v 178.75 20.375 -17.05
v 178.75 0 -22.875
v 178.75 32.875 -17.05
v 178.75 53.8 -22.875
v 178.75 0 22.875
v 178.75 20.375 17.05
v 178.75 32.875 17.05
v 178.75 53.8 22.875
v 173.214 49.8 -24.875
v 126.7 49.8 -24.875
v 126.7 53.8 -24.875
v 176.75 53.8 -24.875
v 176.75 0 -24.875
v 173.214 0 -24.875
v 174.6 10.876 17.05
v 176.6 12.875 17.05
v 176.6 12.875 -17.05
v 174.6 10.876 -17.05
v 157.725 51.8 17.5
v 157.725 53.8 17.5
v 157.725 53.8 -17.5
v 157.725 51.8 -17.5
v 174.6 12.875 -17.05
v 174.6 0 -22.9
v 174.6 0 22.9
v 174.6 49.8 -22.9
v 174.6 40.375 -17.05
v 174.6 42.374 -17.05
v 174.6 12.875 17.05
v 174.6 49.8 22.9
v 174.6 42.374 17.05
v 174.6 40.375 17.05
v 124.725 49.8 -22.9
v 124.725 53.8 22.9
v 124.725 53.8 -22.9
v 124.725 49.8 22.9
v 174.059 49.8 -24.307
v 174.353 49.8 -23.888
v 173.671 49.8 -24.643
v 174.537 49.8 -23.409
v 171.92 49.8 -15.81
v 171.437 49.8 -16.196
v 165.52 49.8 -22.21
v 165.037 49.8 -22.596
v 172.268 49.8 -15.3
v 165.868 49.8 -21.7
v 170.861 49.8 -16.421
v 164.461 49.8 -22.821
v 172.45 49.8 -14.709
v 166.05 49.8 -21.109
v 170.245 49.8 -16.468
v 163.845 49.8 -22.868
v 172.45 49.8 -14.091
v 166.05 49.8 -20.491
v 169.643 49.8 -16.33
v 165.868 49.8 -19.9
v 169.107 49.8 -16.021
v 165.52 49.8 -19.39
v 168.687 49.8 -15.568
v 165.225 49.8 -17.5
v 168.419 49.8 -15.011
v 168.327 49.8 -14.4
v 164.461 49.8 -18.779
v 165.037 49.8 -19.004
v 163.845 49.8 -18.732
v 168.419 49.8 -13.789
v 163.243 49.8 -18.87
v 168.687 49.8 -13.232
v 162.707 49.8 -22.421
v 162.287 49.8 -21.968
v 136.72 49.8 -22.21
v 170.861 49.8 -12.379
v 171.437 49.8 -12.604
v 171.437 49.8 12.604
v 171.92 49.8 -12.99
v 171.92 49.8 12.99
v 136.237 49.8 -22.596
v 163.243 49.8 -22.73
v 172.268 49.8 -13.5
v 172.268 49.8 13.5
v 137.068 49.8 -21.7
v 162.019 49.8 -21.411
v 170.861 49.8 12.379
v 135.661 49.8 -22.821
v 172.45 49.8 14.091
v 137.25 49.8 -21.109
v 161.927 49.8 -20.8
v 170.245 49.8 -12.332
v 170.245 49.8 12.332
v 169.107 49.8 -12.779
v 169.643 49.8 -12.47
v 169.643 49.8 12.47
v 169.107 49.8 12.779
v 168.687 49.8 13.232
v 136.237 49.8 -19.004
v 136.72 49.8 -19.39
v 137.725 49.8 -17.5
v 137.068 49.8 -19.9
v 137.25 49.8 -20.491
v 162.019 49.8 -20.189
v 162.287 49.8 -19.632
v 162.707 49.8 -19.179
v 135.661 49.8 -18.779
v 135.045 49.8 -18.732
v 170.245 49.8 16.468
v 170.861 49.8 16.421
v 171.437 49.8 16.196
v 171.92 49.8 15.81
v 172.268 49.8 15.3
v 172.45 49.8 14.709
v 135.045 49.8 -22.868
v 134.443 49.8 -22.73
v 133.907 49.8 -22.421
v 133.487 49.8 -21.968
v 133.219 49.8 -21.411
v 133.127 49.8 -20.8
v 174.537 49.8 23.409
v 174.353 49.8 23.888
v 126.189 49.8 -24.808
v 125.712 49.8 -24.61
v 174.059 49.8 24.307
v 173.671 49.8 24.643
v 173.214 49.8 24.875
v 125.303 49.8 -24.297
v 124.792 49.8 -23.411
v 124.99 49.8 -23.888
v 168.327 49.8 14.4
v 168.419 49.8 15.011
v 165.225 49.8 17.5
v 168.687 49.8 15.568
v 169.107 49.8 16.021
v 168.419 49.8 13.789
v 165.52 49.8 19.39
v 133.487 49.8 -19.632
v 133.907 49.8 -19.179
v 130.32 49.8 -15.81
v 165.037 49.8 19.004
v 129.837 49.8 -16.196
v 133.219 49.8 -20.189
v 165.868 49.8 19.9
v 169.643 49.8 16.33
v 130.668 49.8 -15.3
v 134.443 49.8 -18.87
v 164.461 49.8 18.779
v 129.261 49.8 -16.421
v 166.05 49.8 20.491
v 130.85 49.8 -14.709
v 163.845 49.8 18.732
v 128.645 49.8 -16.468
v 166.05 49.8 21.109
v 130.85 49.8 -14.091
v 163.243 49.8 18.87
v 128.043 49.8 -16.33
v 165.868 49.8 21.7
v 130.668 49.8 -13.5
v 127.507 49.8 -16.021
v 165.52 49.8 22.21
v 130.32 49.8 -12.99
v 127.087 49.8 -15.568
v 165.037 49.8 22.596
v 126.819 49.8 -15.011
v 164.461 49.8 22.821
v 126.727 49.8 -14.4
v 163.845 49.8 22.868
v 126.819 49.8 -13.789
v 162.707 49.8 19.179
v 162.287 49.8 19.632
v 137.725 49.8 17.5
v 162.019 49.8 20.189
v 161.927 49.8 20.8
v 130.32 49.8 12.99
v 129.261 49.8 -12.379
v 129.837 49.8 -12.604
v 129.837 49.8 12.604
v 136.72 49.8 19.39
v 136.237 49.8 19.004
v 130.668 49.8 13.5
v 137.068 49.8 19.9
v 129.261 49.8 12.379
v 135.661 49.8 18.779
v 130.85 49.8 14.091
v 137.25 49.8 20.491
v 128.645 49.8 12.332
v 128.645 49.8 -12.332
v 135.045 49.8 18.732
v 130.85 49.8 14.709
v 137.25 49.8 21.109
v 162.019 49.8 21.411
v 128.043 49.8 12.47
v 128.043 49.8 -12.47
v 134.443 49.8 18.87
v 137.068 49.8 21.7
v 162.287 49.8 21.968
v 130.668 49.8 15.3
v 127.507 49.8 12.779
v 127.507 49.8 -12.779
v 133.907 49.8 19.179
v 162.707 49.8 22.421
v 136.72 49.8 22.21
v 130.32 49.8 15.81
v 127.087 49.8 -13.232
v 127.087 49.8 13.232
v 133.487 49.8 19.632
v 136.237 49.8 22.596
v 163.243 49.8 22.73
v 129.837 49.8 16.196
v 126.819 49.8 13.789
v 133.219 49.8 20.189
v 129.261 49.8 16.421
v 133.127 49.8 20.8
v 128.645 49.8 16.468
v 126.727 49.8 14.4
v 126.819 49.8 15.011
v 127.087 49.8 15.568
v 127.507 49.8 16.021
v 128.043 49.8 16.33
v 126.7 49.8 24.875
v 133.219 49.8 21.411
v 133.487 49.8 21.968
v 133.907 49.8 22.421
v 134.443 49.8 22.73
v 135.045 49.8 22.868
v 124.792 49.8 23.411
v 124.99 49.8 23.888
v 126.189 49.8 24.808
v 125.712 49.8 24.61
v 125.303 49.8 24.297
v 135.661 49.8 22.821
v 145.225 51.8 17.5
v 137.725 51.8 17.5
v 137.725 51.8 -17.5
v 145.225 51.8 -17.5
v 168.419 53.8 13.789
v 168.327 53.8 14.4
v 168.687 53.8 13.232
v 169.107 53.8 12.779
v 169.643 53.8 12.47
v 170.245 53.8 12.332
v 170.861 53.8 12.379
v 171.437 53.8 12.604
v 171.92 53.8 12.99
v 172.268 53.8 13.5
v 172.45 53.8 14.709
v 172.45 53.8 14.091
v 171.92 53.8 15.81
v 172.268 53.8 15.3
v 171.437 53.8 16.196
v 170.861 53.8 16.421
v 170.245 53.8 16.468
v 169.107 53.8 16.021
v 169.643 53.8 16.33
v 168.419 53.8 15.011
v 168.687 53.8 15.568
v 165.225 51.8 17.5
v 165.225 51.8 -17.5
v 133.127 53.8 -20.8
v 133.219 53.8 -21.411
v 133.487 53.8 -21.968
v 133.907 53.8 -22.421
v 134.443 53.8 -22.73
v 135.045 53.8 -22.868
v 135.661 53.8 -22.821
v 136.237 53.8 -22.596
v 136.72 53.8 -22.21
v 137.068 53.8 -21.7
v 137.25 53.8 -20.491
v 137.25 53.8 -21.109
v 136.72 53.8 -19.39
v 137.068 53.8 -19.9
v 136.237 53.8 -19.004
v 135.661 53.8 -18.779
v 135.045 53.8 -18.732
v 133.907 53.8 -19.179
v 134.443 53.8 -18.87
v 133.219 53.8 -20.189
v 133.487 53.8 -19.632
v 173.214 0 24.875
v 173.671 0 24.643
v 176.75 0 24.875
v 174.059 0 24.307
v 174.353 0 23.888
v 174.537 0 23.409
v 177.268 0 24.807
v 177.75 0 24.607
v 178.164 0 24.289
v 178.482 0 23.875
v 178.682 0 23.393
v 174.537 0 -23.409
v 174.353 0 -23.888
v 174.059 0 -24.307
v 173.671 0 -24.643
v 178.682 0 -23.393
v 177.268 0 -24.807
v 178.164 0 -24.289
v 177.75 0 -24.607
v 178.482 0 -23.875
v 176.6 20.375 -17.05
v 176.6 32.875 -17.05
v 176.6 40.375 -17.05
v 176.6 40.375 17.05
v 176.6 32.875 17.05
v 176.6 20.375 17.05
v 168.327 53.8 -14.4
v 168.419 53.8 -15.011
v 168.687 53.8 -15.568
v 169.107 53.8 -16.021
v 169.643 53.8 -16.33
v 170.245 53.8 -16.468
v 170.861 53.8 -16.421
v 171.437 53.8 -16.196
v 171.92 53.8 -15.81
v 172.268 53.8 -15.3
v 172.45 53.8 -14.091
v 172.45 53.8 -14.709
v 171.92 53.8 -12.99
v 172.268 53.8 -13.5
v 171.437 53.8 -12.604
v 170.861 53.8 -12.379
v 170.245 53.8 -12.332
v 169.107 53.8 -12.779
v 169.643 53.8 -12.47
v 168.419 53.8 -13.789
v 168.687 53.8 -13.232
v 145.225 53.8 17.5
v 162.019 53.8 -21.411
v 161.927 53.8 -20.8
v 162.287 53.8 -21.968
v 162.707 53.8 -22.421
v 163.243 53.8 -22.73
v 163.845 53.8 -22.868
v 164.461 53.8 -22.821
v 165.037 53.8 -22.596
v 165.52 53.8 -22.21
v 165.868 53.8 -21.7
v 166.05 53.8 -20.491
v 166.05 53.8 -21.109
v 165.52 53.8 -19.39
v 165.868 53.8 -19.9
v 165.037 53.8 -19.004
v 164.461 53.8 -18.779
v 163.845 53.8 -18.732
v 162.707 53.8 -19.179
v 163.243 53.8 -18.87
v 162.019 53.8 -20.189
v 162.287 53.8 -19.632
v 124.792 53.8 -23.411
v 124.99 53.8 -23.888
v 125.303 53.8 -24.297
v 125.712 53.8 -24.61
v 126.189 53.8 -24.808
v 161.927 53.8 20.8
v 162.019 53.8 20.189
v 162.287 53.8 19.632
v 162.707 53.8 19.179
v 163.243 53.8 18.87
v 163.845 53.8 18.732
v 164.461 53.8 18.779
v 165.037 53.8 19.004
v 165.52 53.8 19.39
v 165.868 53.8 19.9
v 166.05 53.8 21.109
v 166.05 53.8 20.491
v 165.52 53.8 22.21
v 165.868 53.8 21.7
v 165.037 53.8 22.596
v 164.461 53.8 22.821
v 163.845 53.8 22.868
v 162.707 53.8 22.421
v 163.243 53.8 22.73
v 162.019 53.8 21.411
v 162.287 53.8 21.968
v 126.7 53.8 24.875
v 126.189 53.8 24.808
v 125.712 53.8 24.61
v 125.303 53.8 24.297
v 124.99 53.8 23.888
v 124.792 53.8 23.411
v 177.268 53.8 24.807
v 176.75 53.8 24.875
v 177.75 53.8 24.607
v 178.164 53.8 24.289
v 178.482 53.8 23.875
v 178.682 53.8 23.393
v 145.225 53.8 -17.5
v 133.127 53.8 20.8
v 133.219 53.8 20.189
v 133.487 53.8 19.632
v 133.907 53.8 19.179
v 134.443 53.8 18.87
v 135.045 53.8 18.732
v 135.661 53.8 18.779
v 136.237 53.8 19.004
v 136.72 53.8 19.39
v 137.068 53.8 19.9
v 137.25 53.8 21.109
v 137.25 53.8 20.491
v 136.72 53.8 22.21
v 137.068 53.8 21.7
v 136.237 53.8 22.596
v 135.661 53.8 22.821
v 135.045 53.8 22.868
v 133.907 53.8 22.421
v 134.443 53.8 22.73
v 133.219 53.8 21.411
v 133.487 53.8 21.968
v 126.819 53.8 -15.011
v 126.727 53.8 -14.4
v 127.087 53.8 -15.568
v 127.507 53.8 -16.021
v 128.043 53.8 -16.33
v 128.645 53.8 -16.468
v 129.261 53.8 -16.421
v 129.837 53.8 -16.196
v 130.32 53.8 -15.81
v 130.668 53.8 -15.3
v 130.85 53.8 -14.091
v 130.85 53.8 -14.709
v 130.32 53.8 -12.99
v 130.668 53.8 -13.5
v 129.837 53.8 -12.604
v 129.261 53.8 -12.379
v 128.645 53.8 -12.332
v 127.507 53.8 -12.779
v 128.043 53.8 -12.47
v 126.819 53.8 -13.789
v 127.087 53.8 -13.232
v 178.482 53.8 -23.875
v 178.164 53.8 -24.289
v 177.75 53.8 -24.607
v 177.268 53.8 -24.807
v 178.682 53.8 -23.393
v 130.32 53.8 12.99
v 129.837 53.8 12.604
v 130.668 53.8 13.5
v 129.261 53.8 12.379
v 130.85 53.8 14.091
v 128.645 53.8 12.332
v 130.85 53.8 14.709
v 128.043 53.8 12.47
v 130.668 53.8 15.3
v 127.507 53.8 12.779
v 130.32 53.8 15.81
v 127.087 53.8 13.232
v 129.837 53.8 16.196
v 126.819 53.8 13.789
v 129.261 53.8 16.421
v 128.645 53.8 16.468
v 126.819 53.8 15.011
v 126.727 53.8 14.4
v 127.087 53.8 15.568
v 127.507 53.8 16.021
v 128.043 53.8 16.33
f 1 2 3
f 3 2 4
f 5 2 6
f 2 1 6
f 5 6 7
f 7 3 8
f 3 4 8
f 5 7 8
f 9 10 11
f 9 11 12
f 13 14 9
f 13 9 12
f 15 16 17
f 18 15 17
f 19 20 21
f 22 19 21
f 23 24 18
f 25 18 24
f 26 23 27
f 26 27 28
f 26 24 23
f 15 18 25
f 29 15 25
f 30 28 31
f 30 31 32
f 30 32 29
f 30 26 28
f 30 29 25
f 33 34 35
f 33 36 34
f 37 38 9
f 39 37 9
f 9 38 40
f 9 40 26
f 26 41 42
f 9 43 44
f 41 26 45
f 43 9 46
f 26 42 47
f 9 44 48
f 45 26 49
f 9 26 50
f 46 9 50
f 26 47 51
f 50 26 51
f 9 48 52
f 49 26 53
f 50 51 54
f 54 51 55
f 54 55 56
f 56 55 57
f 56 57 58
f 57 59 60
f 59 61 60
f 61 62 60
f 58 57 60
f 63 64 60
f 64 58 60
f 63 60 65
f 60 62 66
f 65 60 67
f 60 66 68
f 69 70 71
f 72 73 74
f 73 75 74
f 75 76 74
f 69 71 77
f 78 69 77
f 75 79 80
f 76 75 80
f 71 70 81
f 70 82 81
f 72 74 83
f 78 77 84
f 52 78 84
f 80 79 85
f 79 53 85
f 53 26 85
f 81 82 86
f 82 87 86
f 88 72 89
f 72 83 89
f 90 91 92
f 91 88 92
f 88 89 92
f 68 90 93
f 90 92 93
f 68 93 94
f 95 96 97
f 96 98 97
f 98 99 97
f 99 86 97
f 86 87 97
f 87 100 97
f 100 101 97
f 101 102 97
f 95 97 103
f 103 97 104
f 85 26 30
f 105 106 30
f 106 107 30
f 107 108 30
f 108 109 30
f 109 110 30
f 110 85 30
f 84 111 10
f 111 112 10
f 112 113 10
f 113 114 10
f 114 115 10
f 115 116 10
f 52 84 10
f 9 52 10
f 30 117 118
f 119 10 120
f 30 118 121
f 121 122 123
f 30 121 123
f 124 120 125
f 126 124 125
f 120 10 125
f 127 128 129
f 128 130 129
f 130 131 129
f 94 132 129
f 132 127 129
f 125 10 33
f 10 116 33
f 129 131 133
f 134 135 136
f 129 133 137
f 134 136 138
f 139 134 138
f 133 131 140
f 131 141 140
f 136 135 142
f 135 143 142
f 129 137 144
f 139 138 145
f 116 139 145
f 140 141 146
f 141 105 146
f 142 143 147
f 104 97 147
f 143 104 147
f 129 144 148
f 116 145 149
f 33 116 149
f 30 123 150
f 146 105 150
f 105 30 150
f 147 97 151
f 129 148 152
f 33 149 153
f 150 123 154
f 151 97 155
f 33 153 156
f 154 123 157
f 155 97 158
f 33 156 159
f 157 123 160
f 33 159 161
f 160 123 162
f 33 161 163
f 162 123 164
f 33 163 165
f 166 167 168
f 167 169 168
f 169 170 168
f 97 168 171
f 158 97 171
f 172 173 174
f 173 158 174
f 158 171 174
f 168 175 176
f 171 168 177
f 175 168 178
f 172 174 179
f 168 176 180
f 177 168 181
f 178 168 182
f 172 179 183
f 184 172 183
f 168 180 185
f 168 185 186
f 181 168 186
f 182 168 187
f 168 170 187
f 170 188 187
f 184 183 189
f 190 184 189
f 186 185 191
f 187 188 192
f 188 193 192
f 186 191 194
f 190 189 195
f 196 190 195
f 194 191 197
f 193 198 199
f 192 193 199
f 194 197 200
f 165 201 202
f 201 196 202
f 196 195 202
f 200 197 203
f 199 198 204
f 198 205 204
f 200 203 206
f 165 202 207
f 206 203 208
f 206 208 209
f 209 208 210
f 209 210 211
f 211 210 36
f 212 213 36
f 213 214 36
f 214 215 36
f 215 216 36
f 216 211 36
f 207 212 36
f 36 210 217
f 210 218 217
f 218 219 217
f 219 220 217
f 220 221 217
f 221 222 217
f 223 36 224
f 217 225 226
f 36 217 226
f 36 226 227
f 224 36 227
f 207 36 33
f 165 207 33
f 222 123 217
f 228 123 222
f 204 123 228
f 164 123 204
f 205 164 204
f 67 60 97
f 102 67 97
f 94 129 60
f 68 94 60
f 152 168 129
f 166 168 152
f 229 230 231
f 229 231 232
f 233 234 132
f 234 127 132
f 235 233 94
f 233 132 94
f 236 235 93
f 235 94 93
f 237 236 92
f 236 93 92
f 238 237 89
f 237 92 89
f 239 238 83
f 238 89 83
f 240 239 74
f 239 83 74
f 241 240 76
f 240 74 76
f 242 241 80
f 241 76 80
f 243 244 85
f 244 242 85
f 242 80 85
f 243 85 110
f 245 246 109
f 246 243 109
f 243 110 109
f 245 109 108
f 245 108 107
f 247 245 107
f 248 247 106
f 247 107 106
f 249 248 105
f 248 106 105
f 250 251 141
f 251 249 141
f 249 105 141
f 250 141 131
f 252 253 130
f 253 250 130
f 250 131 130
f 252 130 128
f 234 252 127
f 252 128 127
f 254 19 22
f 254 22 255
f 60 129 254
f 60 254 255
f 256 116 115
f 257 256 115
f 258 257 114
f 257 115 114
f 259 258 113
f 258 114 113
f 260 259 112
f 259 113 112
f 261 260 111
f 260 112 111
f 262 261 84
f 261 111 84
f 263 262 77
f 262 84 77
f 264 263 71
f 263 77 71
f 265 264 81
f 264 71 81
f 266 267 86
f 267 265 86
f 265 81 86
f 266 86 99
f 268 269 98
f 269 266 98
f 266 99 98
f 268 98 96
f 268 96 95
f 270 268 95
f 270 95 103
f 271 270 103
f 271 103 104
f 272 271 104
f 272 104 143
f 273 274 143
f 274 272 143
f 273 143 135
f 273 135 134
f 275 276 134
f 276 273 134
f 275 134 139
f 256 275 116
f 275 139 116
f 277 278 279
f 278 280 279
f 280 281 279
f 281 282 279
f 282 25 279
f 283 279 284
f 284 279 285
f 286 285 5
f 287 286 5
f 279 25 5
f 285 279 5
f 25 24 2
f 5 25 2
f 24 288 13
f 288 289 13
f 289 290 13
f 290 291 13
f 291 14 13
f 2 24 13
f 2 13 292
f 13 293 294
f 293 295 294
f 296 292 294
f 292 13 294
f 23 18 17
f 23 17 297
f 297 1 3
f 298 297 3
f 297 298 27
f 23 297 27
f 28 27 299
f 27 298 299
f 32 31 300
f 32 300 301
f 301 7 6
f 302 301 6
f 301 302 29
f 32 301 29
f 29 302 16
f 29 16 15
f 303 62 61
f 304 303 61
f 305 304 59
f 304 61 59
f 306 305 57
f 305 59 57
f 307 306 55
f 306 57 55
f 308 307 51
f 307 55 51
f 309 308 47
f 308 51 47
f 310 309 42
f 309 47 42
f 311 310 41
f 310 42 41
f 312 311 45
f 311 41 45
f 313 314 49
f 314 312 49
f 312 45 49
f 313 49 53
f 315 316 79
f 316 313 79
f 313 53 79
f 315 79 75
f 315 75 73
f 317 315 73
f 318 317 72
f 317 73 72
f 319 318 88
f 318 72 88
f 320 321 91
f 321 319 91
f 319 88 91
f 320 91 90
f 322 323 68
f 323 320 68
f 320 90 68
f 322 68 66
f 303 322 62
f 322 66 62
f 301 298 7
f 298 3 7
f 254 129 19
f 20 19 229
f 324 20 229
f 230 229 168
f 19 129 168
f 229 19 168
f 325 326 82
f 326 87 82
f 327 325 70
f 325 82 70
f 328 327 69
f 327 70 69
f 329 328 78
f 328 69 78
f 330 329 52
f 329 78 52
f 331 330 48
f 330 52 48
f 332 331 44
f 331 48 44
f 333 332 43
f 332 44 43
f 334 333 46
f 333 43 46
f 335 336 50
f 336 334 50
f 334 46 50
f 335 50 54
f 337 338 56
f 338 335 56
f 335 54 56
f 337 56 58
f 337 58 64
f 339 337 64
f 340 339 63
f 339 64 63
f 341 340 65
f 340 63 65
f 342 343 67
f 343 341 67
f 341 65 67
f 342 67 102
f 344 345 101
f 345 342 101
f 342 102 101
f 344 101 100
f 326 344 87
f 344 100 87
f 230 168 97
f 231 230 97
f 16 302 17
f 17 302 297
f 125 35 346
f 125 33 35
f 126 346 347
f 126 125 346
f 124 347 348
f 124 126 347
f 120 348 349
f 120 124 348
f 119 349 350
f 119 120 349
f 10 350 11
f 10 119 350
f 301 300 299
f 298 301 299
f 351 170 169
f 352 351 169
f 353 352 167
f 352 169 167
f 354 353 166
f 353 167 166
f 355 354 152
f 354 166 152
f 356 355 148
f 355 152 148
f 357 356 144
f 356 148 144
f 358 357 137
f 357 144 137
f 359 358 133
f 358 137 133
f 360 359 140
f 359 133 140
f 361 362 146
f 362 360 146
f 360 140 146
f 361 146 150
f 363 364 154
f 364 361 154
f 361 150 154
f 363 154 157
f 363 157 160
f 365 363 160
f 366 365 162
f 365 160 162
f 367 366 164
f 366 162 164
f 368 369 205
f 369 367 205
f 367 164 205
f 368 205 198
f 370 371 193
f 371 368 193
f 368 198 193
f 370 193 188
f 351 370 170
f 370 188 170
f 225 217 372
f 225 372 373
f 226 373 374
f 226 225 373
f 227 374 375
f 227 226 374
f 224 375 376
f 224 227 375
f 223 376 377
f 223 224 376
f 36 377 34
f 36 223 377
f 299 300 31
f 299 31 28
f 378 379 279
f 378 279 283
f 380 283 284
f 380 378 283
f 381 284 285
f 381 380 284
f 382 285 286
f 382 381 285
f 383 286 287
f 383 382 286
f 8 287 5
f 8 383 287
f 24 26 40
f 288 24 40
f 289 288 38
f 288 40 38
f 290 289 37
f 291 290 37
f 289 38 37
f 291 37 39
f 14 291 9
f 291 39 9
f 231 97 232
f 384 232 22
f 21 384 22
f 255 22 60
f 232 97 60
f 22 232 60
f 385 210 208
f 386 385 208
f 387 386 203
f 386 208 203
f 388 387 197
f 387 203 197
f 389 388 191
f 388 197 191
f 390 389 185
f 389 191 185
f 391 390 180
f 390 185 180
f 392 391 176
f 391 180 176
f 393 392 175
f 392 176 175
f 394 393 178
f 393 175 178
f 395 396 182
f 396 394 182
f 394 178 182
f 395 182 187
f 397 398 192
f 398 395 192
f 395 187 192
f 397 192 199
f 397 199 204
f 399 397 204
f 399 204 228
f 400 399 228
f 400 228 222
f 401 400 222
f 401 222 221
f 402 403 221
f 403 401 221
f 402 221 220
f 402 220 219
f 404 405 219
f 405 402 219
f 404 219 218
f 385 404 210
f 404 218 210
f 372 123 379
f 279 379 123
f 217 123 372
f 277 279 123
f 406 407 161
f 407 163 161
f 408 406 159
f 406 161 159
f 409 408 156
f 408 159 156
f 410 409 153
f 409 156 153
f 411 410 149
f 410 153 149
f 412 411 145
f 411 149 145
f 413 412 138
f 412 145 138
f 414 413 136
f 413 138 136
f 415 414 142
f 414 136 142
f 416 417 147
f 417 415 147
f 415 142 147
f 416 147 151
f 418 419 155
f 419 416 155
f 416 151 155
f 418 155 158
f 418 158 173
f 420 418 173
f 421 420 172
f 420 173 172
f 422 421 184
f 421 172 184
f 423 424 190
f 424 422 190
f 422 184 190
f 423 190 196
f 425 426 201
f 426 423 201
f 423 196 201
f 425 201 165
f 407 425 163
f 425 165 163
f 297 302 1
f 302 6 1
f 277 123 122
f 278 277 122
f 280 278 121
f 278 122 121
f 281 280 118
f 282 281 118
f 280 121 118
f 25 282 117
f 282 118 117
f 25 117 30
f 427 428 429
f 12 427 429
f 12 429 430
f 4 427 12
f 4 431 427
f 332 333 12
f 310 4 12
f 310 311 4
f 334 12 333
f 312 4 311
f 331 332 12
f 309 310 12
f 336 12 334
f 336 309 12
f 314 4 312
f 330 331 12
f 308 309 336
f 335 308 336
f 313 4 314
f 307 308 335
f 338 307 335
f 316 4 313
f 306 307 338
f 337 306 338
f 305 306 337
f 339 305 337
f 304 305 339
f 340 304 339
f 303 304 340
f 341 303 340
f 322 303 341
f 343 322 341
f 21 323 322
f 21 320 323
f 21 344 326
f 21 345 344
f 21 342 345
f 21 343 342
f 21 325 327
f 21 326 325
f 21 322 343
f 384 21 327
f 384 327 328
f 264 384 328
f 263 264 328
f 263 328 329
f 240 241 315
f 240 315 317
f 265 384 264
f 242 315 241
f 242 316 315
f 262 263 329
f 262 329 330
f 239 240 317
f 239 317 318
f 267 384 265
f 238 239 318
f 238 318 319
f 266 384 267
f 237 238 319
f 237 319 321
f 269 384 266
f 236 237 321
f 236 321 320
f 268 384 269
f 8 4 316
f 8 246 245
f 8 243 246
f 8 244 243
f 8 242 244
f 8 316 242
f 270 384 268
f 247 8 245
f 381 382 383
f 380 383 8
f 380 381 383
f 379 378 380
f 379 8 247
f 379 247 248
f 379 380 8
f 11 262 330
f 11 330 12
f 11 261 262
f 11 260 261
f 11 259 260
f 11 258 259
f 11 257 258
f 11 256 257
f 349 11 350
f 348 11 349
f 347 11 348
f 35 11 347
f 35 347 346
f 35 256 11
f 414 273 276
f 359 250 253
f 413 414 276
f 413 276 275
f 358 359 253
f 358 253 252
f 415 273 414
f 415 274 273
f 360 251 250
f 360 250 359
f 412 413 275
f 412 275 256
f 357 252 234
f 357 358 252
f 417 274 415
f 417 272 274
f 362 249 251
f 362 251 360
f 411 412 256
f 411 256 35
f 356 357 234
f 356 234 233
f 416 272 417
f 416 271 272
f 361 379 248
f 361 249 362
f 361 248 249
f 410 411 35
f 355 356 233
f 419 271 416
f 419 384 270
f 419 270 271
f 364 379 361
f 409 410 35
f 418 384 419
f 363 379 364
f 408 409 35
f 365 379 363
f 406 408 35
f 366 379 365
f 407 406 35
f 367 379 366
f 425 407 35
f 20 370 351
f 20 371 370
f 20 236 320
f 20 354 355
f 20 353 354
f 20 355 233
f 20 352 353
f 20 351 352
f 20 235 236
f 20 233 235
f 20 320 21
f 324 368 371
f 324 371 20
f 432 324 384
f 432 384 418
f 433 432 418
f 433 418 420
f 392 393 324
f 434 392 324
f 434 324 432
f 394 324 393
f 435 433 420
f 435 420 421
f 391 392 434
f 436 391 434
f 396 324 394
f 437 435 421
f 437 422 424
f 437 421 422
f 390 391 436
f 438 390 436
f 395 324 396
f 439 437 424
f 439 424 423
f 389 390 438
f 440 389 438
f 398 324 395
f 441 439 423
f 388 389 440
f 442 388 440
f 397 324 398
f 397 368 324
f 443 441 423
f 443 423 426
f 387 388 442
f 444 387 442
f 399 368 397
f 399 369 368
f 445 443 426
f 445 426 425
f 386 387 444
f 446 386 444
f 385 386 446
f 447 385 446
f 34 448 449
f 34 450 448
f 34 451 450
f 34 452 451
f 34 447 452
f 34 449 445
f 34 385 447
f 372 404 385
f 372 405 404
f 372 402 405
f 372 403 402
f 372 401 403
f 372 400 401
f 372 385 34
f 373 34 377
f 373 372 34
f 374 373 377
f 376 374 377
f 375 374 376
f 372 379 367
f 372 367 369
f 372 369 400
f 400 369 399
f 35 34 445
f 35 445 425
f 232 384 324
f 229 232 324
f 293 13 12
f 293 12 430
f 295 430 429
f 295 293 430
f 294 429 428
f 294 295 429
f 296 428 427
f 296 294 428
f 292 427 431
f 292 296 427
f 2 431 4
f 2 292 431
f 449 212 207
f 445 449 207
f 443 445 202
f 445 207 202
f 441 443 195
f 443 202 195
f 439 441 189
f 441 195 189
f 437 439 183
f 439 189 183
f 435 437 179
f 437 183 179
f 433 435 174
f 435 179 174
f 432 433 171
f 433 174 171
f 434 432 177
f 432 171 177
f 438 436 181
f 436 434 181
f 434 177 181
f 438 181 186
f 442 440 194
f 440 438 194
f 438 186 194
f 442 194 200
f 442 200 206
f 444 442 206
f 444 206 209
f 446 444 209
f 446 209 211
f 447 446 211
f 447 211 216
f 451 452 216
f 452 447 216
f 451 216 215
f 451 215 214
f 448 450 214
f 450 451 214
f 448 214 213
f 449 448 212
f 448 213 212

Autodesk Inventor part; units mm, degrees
ref_plane "YZ Plane" through (0, 0, 0) normal (1, 0, 0) x (0, 1, 0)
ref_plane "XZ Plane" through (0, 0, 0) normal (0, 1, 0) x (-1, 0, 0)
sketch "Sketch1" plane through (0, 0, 0) normal (0, 1, 0) x (-1, 0, 0)
  line L0 (-155.225, -15) -> (-155.225, 15) projected
  line L1 (-155.225, 15) -> (-147.725, 15) projected
  line L2 (-147.725, 15) -> (-147.725, -15) projected
  line L3 (-147.725, -15) -> (-155.225, -15) projected
  circle A0 centre (-171.5, -21.9) radius 1.875 projected
  circle A1 centre (-127.7, 21.9) radius 1.875 projected
  circle A2 centre (-127.7, -21.9) radius 1.875 projected
  circle A3 centre (-171.5, 21.9) radius 1.875 projected
  circle A4 centre (-135.2, 20.8) radius 2.0734 projected
  circle A5 centre (-164, -20.8) radius 2.0734 projected
  circle A6 centre (-135.2, -20.8) radius 2.0734 projected
  circle A7 centre (-128.8, -14.4) radius 2.0734 projected
  circle A8 centre (-128.8, 14.4) radius 2.0734 projected
  circle A9 centre (-164, 20.8) radius 2.0734 projected
  circle A10 centre (-170.4, -14.4) radius 2.0734 projected
  circle A11 centre (-170.4, 14.4) radius 2.0734 projected
  line L4 (-172.5, 24.875) -> (-126.7, 24.875) projected
  arc A12 (-172.5, 24.875) -> (-174.475, 22.9) centre (-172.5, 22.9) ccw projected
  line L5 (-174.475, -22.9) -> (-174.475, 22.9) projected
  arc A13 (-174.475, -22.9) -> (-172.5, -24.875) centre (-172.5, -22.9) ccw projected
  line L6 (-126.7, -24.875) -> (-172.5, -24.875) projected
  arc A14 (-126.7, -24.875) -> (-124.725, -22.9) centre (-126.7, -22.9) ccw projected
  line L7 (-124.725, 22.9) -> (-124.725, -22.9) projected
  arc A15 (-124.725, 22.9) -> (-126.7, 24.875) centre (-126.7, 22.9) ccw projected
  point P0 (0, 0)
ref_plane "Work Plane1" through (124.725, 49.8, -24.875) normal (0, 1, 0) x (0, 0, 1)
extrude "Extrusion1" add sketch "Sketch1" along normal blind 4 from surface at 49.8 contours A0 | A1 | A2 | A3 | L4 A15 L7 A14 L6 A13 L5 A12
sketch "Sketch2" plane through (126.7, 53.8, -24.875) normal (0, 1, 0) x (1, 0, 0)
  line L0 (28.525, -9.875) -> (21.025, -9.875) projected
  line L1 (28.525, -39.875) -> (28.525, -9.875) projected
  line L2 (21.025, -39.875) -> (28.525, -39.875) projected
  line L3 (21.025, -9.875) -> (21.025, -39.875) projected
  circle A0 centre (8.5, -45.675) radius 2.0734 projected
  circle A1 centre (37.3, -4.075) radius 2.0734 projected
  circle A2 centre (8.5, -4.075) radius 2.0734 projected
  circle A3 centre (2.1, -10.475) radius 2.0734 projected
  circle A4 centre (2.1, -39.275) radius 2.0734 projected
  circle A5 centre (37.3, -45.675) radius 2.0734 projected
  circle A6 centre (43.7, -10.475) radius 2.0734 projected
  circle A7 centre (43.7, -39.275) radius 2.0734 projected
  arc A8 (47.775, -1.975) -> (45.8, 0) centre (45.8, -1.975) ccw projected
  line L4 (0, 0) -> (45.8, 0) projected
  arc A9 (0, 0) -> (-1.975, -1.975) centre (0, -1.975) ccw projected
  line L5 (-1.975, -47.775) -> (-1.975, -1.975) projected
  arc A10 (-1.975, -47.775) -> (0, -49.75) centre (0, -47.775) ccw projected
  line L6 (45.8, -49.75) -> (0, -49.75) projected
  arc A11 (45.8, -49.75) -> (47.775, -47.775) centre (45.8, -47.775) ccw projected
  line L7 (47.775, -1.975) -> (47.775, -47.775) projected
  line L8 (18.525, -42.375) -> (31.025, -42.375)
  line L9 (31.025, -42.375) -> (31.025, -7.375)
  line L10 (31.025, -7.375) -> (18.525, -7.375)
  line L11 (18.525, -7.375) -> (18.525, -42.375)
  line L12 (45.8, 0) -> (52.05, 0)
  line L13 (52.05, 0) -> (52.05, -49.75)
  line L14 (52.05, -49.75) -> (45.8, -49.75)
  line L15 (45.8, -49.75) -> (45.8, 0)
  line L16 (52.05, -49.75) -> (47.925, -49.75)
  line L17 (47.925, -49.75) -> (47.925, 0)
  line L18 (47.925, 0) -> (52.05, 0)
  line L19 (52.05, 0) -> (52.05, -49.75)
  arc A12 (45.8, -49.875) -> (47.9, -47.775) centre (45.8, -47.775) ccw
  line L20 (45.8, -49.875) -> (0, -49.875)
  arc A13 (-2.1, -47.775) -> (0, -49.875) centre (0, -47.775) ccw
  line L21 (-2.1, -47.775) -> (-2.1, -1.975)
  arc A14 (0, 0.125) -> (-2.1, -1.975) centre (0, -1.975) ccw
  line L22 (0, 0.125) -> (45.8, 0.125)
  arc A15 (47.9, -1.975) -> (45.8, 0.125) centre (45.8, -1.975) ccw
  line L23 (47.9, -1.975) -> (47.9, -47.775)
  line L24 (18.525, -42.375) -> (11.025, -42.375)
  line L25 (11.025, -42.375) -> (11.025, -7.375)
  line L26 (11.025, -7.375) -> (18.525, -7.375)
  line L27 (18.525, -7.375) -> (18.525, -42.375)
  line L28 (31.025, -42.375) -> (38.525, -42.375)
  line L29 (38.525, -42.375) -> (38.525, -7.375)
  line L30 (38.525, -7.375) -> (31.025, -7.375)
  line L31 (31.025, -7.375) -> (31.025, -42.375)
  point P0 (-126.7, -24.875)
  point P1 (46.5137, -49.75)
  point P2 (46.5137, 0)
  point P3 (31.025, -7.375)
  point P4 (18.525, -7.375)
  dimension "d2" = 2.5
  dimension "d3" = 6.25
  dimension "d4" = 4.125
  dimension "d15" = 0.125
  dimension "d16" = 7.5
  dimension "d17" = 7.5
extrude "Extrusion2" cut sketch "Sketch2" against normal up to surface (4 mm away) contours L11 L10 L9 L8
extrude "Extrusion3" add sketch "Sketch2" against normal up to surface (4 mm away) contours A8 L12 A15 L23 A12 L14 A11 L7 | L12 L17 L14 A12 L23 A15 | L12 L13 L14 L17
extrude "Extrusion4" add sketch "Sketch2" against normal blind 49.8 from surface at -4 contours L12 L17 L14 A12 L23 A15 | L12 L13 L14 L17
extrude "Extrusion5" cut sketch "Sketch2" along normal blind 2 from surface at -4 contours L24 L25 L26 L11 | L9 L30 L29 L28
fillet "Fillet1" radius 2 2 edges at (178.75, 26.9, 24.875) (178.75, 26.9, -24.875)
sketch "Sketch3" plane through (178.75, 53.8, 22.875) normal (1, 0, 0) x (0, 0, -1)
  line L0 (7.875, -23.425) -> (7.875, -30.925) projected
  line L1 (7.875, -30.925) -> (37.875, -30.925) projected
  line L2 (37.875, -30.925) -> (37.875, -23.425) projected
  line L3 (37.875, -23.425) -> (7.875, -23.425) projected
  line L4 (5.825, -11.7) -> (39.925, -11.7) projected
  line L5 (39.925, -46.1) -> (39.925, -11.7) projected
  line L6 (5.825, -46.1) -> (39.925, -46.1) projected
  line L7 (5.825, -11.7) -> (5.825, -46.1) projected
  line L8 (5.375, -20.925) -> (5.375, -33.425)
  line L9 (5.375, -33.425) -> (40.375, -33.425)
  line L10 (40.375, -33.425) -> (40.375, -20.925)
  line L11 (40.375, -20.925) -> (5.375, -20.925)
  point P0 (22.875, -53.8)
  point P1 (39.925, -20.925)
  point P2 (5.825, -20.925)
  point P3 (5.825, -33.425)
  point P4 (39.925, -33.425)
  dimension "d12" = 2.5
extrude "Extrusion6" cut sketch "Sketch3" against normal up to surface (4.15 mm away) contours L3 L2 L1 L0 | L11 L5 L9 L7
sketch "Sketch4" plane through (178.75, 53.8, 22.875) normal (1, 0, 0) x (0, 0, -1)
  line L0 (5.825, -20.925) -> (39.925, -20.925) projected
  line L1 (39.925, -20.925) -> (39.925, -33.425) projected
  line L2 (39.925, -33.425) -> (5.825, -33.425) projected
  line L3 (5.825, -33.425) -> (5.825, -20.925) projected
  line L4 (45.75, 0) -> (45.75, -53.8) projected
  line L5 (0, 0) -> (45.75, 0) projected
  line L6 (0, -53.8) -> (0, 0) projected
  line L7 (45.75, -53.8) -> (0, -53.8) projected
  line L8 (5.825, -20.925) -> (39.925, -20.925)
  line L9 (39.925, -20.925) -> (39.925, -13.425)
  line L10 (39.925, -13.425) -> (5.825, -13.425)
  line L11 (5.825, -13.425) -> (5.825, -20.925)
  line L12 (5.825, -33.425) -> (39.925, -33.425)
  line L13 (39.925, -33.425) -> (39.925, -40.925)
  line L14 (39.925, -40.925) -> (5.825, -40.925)
  line L15 (5.825, -40.925) -> (5.825, -33.425)
  point P0 (22.875, -53.8)
  point P1 (39.925, -20.925)
  dimension "d20" = 7.5
  dimension "d21" = 7.5
extrude "Extrusion7" cut sketch "Sketch4" along normal blind 2 from surface at -4.15 contours L11 L10 L9 L0 | L2 L13 L14 L15
chamfer "Chamfer1" distance 2 angle 45 2 edges at (174.6, 40.375, 0) (174.6, 12.875, 0)
properties part number "Lens Light Cover"
